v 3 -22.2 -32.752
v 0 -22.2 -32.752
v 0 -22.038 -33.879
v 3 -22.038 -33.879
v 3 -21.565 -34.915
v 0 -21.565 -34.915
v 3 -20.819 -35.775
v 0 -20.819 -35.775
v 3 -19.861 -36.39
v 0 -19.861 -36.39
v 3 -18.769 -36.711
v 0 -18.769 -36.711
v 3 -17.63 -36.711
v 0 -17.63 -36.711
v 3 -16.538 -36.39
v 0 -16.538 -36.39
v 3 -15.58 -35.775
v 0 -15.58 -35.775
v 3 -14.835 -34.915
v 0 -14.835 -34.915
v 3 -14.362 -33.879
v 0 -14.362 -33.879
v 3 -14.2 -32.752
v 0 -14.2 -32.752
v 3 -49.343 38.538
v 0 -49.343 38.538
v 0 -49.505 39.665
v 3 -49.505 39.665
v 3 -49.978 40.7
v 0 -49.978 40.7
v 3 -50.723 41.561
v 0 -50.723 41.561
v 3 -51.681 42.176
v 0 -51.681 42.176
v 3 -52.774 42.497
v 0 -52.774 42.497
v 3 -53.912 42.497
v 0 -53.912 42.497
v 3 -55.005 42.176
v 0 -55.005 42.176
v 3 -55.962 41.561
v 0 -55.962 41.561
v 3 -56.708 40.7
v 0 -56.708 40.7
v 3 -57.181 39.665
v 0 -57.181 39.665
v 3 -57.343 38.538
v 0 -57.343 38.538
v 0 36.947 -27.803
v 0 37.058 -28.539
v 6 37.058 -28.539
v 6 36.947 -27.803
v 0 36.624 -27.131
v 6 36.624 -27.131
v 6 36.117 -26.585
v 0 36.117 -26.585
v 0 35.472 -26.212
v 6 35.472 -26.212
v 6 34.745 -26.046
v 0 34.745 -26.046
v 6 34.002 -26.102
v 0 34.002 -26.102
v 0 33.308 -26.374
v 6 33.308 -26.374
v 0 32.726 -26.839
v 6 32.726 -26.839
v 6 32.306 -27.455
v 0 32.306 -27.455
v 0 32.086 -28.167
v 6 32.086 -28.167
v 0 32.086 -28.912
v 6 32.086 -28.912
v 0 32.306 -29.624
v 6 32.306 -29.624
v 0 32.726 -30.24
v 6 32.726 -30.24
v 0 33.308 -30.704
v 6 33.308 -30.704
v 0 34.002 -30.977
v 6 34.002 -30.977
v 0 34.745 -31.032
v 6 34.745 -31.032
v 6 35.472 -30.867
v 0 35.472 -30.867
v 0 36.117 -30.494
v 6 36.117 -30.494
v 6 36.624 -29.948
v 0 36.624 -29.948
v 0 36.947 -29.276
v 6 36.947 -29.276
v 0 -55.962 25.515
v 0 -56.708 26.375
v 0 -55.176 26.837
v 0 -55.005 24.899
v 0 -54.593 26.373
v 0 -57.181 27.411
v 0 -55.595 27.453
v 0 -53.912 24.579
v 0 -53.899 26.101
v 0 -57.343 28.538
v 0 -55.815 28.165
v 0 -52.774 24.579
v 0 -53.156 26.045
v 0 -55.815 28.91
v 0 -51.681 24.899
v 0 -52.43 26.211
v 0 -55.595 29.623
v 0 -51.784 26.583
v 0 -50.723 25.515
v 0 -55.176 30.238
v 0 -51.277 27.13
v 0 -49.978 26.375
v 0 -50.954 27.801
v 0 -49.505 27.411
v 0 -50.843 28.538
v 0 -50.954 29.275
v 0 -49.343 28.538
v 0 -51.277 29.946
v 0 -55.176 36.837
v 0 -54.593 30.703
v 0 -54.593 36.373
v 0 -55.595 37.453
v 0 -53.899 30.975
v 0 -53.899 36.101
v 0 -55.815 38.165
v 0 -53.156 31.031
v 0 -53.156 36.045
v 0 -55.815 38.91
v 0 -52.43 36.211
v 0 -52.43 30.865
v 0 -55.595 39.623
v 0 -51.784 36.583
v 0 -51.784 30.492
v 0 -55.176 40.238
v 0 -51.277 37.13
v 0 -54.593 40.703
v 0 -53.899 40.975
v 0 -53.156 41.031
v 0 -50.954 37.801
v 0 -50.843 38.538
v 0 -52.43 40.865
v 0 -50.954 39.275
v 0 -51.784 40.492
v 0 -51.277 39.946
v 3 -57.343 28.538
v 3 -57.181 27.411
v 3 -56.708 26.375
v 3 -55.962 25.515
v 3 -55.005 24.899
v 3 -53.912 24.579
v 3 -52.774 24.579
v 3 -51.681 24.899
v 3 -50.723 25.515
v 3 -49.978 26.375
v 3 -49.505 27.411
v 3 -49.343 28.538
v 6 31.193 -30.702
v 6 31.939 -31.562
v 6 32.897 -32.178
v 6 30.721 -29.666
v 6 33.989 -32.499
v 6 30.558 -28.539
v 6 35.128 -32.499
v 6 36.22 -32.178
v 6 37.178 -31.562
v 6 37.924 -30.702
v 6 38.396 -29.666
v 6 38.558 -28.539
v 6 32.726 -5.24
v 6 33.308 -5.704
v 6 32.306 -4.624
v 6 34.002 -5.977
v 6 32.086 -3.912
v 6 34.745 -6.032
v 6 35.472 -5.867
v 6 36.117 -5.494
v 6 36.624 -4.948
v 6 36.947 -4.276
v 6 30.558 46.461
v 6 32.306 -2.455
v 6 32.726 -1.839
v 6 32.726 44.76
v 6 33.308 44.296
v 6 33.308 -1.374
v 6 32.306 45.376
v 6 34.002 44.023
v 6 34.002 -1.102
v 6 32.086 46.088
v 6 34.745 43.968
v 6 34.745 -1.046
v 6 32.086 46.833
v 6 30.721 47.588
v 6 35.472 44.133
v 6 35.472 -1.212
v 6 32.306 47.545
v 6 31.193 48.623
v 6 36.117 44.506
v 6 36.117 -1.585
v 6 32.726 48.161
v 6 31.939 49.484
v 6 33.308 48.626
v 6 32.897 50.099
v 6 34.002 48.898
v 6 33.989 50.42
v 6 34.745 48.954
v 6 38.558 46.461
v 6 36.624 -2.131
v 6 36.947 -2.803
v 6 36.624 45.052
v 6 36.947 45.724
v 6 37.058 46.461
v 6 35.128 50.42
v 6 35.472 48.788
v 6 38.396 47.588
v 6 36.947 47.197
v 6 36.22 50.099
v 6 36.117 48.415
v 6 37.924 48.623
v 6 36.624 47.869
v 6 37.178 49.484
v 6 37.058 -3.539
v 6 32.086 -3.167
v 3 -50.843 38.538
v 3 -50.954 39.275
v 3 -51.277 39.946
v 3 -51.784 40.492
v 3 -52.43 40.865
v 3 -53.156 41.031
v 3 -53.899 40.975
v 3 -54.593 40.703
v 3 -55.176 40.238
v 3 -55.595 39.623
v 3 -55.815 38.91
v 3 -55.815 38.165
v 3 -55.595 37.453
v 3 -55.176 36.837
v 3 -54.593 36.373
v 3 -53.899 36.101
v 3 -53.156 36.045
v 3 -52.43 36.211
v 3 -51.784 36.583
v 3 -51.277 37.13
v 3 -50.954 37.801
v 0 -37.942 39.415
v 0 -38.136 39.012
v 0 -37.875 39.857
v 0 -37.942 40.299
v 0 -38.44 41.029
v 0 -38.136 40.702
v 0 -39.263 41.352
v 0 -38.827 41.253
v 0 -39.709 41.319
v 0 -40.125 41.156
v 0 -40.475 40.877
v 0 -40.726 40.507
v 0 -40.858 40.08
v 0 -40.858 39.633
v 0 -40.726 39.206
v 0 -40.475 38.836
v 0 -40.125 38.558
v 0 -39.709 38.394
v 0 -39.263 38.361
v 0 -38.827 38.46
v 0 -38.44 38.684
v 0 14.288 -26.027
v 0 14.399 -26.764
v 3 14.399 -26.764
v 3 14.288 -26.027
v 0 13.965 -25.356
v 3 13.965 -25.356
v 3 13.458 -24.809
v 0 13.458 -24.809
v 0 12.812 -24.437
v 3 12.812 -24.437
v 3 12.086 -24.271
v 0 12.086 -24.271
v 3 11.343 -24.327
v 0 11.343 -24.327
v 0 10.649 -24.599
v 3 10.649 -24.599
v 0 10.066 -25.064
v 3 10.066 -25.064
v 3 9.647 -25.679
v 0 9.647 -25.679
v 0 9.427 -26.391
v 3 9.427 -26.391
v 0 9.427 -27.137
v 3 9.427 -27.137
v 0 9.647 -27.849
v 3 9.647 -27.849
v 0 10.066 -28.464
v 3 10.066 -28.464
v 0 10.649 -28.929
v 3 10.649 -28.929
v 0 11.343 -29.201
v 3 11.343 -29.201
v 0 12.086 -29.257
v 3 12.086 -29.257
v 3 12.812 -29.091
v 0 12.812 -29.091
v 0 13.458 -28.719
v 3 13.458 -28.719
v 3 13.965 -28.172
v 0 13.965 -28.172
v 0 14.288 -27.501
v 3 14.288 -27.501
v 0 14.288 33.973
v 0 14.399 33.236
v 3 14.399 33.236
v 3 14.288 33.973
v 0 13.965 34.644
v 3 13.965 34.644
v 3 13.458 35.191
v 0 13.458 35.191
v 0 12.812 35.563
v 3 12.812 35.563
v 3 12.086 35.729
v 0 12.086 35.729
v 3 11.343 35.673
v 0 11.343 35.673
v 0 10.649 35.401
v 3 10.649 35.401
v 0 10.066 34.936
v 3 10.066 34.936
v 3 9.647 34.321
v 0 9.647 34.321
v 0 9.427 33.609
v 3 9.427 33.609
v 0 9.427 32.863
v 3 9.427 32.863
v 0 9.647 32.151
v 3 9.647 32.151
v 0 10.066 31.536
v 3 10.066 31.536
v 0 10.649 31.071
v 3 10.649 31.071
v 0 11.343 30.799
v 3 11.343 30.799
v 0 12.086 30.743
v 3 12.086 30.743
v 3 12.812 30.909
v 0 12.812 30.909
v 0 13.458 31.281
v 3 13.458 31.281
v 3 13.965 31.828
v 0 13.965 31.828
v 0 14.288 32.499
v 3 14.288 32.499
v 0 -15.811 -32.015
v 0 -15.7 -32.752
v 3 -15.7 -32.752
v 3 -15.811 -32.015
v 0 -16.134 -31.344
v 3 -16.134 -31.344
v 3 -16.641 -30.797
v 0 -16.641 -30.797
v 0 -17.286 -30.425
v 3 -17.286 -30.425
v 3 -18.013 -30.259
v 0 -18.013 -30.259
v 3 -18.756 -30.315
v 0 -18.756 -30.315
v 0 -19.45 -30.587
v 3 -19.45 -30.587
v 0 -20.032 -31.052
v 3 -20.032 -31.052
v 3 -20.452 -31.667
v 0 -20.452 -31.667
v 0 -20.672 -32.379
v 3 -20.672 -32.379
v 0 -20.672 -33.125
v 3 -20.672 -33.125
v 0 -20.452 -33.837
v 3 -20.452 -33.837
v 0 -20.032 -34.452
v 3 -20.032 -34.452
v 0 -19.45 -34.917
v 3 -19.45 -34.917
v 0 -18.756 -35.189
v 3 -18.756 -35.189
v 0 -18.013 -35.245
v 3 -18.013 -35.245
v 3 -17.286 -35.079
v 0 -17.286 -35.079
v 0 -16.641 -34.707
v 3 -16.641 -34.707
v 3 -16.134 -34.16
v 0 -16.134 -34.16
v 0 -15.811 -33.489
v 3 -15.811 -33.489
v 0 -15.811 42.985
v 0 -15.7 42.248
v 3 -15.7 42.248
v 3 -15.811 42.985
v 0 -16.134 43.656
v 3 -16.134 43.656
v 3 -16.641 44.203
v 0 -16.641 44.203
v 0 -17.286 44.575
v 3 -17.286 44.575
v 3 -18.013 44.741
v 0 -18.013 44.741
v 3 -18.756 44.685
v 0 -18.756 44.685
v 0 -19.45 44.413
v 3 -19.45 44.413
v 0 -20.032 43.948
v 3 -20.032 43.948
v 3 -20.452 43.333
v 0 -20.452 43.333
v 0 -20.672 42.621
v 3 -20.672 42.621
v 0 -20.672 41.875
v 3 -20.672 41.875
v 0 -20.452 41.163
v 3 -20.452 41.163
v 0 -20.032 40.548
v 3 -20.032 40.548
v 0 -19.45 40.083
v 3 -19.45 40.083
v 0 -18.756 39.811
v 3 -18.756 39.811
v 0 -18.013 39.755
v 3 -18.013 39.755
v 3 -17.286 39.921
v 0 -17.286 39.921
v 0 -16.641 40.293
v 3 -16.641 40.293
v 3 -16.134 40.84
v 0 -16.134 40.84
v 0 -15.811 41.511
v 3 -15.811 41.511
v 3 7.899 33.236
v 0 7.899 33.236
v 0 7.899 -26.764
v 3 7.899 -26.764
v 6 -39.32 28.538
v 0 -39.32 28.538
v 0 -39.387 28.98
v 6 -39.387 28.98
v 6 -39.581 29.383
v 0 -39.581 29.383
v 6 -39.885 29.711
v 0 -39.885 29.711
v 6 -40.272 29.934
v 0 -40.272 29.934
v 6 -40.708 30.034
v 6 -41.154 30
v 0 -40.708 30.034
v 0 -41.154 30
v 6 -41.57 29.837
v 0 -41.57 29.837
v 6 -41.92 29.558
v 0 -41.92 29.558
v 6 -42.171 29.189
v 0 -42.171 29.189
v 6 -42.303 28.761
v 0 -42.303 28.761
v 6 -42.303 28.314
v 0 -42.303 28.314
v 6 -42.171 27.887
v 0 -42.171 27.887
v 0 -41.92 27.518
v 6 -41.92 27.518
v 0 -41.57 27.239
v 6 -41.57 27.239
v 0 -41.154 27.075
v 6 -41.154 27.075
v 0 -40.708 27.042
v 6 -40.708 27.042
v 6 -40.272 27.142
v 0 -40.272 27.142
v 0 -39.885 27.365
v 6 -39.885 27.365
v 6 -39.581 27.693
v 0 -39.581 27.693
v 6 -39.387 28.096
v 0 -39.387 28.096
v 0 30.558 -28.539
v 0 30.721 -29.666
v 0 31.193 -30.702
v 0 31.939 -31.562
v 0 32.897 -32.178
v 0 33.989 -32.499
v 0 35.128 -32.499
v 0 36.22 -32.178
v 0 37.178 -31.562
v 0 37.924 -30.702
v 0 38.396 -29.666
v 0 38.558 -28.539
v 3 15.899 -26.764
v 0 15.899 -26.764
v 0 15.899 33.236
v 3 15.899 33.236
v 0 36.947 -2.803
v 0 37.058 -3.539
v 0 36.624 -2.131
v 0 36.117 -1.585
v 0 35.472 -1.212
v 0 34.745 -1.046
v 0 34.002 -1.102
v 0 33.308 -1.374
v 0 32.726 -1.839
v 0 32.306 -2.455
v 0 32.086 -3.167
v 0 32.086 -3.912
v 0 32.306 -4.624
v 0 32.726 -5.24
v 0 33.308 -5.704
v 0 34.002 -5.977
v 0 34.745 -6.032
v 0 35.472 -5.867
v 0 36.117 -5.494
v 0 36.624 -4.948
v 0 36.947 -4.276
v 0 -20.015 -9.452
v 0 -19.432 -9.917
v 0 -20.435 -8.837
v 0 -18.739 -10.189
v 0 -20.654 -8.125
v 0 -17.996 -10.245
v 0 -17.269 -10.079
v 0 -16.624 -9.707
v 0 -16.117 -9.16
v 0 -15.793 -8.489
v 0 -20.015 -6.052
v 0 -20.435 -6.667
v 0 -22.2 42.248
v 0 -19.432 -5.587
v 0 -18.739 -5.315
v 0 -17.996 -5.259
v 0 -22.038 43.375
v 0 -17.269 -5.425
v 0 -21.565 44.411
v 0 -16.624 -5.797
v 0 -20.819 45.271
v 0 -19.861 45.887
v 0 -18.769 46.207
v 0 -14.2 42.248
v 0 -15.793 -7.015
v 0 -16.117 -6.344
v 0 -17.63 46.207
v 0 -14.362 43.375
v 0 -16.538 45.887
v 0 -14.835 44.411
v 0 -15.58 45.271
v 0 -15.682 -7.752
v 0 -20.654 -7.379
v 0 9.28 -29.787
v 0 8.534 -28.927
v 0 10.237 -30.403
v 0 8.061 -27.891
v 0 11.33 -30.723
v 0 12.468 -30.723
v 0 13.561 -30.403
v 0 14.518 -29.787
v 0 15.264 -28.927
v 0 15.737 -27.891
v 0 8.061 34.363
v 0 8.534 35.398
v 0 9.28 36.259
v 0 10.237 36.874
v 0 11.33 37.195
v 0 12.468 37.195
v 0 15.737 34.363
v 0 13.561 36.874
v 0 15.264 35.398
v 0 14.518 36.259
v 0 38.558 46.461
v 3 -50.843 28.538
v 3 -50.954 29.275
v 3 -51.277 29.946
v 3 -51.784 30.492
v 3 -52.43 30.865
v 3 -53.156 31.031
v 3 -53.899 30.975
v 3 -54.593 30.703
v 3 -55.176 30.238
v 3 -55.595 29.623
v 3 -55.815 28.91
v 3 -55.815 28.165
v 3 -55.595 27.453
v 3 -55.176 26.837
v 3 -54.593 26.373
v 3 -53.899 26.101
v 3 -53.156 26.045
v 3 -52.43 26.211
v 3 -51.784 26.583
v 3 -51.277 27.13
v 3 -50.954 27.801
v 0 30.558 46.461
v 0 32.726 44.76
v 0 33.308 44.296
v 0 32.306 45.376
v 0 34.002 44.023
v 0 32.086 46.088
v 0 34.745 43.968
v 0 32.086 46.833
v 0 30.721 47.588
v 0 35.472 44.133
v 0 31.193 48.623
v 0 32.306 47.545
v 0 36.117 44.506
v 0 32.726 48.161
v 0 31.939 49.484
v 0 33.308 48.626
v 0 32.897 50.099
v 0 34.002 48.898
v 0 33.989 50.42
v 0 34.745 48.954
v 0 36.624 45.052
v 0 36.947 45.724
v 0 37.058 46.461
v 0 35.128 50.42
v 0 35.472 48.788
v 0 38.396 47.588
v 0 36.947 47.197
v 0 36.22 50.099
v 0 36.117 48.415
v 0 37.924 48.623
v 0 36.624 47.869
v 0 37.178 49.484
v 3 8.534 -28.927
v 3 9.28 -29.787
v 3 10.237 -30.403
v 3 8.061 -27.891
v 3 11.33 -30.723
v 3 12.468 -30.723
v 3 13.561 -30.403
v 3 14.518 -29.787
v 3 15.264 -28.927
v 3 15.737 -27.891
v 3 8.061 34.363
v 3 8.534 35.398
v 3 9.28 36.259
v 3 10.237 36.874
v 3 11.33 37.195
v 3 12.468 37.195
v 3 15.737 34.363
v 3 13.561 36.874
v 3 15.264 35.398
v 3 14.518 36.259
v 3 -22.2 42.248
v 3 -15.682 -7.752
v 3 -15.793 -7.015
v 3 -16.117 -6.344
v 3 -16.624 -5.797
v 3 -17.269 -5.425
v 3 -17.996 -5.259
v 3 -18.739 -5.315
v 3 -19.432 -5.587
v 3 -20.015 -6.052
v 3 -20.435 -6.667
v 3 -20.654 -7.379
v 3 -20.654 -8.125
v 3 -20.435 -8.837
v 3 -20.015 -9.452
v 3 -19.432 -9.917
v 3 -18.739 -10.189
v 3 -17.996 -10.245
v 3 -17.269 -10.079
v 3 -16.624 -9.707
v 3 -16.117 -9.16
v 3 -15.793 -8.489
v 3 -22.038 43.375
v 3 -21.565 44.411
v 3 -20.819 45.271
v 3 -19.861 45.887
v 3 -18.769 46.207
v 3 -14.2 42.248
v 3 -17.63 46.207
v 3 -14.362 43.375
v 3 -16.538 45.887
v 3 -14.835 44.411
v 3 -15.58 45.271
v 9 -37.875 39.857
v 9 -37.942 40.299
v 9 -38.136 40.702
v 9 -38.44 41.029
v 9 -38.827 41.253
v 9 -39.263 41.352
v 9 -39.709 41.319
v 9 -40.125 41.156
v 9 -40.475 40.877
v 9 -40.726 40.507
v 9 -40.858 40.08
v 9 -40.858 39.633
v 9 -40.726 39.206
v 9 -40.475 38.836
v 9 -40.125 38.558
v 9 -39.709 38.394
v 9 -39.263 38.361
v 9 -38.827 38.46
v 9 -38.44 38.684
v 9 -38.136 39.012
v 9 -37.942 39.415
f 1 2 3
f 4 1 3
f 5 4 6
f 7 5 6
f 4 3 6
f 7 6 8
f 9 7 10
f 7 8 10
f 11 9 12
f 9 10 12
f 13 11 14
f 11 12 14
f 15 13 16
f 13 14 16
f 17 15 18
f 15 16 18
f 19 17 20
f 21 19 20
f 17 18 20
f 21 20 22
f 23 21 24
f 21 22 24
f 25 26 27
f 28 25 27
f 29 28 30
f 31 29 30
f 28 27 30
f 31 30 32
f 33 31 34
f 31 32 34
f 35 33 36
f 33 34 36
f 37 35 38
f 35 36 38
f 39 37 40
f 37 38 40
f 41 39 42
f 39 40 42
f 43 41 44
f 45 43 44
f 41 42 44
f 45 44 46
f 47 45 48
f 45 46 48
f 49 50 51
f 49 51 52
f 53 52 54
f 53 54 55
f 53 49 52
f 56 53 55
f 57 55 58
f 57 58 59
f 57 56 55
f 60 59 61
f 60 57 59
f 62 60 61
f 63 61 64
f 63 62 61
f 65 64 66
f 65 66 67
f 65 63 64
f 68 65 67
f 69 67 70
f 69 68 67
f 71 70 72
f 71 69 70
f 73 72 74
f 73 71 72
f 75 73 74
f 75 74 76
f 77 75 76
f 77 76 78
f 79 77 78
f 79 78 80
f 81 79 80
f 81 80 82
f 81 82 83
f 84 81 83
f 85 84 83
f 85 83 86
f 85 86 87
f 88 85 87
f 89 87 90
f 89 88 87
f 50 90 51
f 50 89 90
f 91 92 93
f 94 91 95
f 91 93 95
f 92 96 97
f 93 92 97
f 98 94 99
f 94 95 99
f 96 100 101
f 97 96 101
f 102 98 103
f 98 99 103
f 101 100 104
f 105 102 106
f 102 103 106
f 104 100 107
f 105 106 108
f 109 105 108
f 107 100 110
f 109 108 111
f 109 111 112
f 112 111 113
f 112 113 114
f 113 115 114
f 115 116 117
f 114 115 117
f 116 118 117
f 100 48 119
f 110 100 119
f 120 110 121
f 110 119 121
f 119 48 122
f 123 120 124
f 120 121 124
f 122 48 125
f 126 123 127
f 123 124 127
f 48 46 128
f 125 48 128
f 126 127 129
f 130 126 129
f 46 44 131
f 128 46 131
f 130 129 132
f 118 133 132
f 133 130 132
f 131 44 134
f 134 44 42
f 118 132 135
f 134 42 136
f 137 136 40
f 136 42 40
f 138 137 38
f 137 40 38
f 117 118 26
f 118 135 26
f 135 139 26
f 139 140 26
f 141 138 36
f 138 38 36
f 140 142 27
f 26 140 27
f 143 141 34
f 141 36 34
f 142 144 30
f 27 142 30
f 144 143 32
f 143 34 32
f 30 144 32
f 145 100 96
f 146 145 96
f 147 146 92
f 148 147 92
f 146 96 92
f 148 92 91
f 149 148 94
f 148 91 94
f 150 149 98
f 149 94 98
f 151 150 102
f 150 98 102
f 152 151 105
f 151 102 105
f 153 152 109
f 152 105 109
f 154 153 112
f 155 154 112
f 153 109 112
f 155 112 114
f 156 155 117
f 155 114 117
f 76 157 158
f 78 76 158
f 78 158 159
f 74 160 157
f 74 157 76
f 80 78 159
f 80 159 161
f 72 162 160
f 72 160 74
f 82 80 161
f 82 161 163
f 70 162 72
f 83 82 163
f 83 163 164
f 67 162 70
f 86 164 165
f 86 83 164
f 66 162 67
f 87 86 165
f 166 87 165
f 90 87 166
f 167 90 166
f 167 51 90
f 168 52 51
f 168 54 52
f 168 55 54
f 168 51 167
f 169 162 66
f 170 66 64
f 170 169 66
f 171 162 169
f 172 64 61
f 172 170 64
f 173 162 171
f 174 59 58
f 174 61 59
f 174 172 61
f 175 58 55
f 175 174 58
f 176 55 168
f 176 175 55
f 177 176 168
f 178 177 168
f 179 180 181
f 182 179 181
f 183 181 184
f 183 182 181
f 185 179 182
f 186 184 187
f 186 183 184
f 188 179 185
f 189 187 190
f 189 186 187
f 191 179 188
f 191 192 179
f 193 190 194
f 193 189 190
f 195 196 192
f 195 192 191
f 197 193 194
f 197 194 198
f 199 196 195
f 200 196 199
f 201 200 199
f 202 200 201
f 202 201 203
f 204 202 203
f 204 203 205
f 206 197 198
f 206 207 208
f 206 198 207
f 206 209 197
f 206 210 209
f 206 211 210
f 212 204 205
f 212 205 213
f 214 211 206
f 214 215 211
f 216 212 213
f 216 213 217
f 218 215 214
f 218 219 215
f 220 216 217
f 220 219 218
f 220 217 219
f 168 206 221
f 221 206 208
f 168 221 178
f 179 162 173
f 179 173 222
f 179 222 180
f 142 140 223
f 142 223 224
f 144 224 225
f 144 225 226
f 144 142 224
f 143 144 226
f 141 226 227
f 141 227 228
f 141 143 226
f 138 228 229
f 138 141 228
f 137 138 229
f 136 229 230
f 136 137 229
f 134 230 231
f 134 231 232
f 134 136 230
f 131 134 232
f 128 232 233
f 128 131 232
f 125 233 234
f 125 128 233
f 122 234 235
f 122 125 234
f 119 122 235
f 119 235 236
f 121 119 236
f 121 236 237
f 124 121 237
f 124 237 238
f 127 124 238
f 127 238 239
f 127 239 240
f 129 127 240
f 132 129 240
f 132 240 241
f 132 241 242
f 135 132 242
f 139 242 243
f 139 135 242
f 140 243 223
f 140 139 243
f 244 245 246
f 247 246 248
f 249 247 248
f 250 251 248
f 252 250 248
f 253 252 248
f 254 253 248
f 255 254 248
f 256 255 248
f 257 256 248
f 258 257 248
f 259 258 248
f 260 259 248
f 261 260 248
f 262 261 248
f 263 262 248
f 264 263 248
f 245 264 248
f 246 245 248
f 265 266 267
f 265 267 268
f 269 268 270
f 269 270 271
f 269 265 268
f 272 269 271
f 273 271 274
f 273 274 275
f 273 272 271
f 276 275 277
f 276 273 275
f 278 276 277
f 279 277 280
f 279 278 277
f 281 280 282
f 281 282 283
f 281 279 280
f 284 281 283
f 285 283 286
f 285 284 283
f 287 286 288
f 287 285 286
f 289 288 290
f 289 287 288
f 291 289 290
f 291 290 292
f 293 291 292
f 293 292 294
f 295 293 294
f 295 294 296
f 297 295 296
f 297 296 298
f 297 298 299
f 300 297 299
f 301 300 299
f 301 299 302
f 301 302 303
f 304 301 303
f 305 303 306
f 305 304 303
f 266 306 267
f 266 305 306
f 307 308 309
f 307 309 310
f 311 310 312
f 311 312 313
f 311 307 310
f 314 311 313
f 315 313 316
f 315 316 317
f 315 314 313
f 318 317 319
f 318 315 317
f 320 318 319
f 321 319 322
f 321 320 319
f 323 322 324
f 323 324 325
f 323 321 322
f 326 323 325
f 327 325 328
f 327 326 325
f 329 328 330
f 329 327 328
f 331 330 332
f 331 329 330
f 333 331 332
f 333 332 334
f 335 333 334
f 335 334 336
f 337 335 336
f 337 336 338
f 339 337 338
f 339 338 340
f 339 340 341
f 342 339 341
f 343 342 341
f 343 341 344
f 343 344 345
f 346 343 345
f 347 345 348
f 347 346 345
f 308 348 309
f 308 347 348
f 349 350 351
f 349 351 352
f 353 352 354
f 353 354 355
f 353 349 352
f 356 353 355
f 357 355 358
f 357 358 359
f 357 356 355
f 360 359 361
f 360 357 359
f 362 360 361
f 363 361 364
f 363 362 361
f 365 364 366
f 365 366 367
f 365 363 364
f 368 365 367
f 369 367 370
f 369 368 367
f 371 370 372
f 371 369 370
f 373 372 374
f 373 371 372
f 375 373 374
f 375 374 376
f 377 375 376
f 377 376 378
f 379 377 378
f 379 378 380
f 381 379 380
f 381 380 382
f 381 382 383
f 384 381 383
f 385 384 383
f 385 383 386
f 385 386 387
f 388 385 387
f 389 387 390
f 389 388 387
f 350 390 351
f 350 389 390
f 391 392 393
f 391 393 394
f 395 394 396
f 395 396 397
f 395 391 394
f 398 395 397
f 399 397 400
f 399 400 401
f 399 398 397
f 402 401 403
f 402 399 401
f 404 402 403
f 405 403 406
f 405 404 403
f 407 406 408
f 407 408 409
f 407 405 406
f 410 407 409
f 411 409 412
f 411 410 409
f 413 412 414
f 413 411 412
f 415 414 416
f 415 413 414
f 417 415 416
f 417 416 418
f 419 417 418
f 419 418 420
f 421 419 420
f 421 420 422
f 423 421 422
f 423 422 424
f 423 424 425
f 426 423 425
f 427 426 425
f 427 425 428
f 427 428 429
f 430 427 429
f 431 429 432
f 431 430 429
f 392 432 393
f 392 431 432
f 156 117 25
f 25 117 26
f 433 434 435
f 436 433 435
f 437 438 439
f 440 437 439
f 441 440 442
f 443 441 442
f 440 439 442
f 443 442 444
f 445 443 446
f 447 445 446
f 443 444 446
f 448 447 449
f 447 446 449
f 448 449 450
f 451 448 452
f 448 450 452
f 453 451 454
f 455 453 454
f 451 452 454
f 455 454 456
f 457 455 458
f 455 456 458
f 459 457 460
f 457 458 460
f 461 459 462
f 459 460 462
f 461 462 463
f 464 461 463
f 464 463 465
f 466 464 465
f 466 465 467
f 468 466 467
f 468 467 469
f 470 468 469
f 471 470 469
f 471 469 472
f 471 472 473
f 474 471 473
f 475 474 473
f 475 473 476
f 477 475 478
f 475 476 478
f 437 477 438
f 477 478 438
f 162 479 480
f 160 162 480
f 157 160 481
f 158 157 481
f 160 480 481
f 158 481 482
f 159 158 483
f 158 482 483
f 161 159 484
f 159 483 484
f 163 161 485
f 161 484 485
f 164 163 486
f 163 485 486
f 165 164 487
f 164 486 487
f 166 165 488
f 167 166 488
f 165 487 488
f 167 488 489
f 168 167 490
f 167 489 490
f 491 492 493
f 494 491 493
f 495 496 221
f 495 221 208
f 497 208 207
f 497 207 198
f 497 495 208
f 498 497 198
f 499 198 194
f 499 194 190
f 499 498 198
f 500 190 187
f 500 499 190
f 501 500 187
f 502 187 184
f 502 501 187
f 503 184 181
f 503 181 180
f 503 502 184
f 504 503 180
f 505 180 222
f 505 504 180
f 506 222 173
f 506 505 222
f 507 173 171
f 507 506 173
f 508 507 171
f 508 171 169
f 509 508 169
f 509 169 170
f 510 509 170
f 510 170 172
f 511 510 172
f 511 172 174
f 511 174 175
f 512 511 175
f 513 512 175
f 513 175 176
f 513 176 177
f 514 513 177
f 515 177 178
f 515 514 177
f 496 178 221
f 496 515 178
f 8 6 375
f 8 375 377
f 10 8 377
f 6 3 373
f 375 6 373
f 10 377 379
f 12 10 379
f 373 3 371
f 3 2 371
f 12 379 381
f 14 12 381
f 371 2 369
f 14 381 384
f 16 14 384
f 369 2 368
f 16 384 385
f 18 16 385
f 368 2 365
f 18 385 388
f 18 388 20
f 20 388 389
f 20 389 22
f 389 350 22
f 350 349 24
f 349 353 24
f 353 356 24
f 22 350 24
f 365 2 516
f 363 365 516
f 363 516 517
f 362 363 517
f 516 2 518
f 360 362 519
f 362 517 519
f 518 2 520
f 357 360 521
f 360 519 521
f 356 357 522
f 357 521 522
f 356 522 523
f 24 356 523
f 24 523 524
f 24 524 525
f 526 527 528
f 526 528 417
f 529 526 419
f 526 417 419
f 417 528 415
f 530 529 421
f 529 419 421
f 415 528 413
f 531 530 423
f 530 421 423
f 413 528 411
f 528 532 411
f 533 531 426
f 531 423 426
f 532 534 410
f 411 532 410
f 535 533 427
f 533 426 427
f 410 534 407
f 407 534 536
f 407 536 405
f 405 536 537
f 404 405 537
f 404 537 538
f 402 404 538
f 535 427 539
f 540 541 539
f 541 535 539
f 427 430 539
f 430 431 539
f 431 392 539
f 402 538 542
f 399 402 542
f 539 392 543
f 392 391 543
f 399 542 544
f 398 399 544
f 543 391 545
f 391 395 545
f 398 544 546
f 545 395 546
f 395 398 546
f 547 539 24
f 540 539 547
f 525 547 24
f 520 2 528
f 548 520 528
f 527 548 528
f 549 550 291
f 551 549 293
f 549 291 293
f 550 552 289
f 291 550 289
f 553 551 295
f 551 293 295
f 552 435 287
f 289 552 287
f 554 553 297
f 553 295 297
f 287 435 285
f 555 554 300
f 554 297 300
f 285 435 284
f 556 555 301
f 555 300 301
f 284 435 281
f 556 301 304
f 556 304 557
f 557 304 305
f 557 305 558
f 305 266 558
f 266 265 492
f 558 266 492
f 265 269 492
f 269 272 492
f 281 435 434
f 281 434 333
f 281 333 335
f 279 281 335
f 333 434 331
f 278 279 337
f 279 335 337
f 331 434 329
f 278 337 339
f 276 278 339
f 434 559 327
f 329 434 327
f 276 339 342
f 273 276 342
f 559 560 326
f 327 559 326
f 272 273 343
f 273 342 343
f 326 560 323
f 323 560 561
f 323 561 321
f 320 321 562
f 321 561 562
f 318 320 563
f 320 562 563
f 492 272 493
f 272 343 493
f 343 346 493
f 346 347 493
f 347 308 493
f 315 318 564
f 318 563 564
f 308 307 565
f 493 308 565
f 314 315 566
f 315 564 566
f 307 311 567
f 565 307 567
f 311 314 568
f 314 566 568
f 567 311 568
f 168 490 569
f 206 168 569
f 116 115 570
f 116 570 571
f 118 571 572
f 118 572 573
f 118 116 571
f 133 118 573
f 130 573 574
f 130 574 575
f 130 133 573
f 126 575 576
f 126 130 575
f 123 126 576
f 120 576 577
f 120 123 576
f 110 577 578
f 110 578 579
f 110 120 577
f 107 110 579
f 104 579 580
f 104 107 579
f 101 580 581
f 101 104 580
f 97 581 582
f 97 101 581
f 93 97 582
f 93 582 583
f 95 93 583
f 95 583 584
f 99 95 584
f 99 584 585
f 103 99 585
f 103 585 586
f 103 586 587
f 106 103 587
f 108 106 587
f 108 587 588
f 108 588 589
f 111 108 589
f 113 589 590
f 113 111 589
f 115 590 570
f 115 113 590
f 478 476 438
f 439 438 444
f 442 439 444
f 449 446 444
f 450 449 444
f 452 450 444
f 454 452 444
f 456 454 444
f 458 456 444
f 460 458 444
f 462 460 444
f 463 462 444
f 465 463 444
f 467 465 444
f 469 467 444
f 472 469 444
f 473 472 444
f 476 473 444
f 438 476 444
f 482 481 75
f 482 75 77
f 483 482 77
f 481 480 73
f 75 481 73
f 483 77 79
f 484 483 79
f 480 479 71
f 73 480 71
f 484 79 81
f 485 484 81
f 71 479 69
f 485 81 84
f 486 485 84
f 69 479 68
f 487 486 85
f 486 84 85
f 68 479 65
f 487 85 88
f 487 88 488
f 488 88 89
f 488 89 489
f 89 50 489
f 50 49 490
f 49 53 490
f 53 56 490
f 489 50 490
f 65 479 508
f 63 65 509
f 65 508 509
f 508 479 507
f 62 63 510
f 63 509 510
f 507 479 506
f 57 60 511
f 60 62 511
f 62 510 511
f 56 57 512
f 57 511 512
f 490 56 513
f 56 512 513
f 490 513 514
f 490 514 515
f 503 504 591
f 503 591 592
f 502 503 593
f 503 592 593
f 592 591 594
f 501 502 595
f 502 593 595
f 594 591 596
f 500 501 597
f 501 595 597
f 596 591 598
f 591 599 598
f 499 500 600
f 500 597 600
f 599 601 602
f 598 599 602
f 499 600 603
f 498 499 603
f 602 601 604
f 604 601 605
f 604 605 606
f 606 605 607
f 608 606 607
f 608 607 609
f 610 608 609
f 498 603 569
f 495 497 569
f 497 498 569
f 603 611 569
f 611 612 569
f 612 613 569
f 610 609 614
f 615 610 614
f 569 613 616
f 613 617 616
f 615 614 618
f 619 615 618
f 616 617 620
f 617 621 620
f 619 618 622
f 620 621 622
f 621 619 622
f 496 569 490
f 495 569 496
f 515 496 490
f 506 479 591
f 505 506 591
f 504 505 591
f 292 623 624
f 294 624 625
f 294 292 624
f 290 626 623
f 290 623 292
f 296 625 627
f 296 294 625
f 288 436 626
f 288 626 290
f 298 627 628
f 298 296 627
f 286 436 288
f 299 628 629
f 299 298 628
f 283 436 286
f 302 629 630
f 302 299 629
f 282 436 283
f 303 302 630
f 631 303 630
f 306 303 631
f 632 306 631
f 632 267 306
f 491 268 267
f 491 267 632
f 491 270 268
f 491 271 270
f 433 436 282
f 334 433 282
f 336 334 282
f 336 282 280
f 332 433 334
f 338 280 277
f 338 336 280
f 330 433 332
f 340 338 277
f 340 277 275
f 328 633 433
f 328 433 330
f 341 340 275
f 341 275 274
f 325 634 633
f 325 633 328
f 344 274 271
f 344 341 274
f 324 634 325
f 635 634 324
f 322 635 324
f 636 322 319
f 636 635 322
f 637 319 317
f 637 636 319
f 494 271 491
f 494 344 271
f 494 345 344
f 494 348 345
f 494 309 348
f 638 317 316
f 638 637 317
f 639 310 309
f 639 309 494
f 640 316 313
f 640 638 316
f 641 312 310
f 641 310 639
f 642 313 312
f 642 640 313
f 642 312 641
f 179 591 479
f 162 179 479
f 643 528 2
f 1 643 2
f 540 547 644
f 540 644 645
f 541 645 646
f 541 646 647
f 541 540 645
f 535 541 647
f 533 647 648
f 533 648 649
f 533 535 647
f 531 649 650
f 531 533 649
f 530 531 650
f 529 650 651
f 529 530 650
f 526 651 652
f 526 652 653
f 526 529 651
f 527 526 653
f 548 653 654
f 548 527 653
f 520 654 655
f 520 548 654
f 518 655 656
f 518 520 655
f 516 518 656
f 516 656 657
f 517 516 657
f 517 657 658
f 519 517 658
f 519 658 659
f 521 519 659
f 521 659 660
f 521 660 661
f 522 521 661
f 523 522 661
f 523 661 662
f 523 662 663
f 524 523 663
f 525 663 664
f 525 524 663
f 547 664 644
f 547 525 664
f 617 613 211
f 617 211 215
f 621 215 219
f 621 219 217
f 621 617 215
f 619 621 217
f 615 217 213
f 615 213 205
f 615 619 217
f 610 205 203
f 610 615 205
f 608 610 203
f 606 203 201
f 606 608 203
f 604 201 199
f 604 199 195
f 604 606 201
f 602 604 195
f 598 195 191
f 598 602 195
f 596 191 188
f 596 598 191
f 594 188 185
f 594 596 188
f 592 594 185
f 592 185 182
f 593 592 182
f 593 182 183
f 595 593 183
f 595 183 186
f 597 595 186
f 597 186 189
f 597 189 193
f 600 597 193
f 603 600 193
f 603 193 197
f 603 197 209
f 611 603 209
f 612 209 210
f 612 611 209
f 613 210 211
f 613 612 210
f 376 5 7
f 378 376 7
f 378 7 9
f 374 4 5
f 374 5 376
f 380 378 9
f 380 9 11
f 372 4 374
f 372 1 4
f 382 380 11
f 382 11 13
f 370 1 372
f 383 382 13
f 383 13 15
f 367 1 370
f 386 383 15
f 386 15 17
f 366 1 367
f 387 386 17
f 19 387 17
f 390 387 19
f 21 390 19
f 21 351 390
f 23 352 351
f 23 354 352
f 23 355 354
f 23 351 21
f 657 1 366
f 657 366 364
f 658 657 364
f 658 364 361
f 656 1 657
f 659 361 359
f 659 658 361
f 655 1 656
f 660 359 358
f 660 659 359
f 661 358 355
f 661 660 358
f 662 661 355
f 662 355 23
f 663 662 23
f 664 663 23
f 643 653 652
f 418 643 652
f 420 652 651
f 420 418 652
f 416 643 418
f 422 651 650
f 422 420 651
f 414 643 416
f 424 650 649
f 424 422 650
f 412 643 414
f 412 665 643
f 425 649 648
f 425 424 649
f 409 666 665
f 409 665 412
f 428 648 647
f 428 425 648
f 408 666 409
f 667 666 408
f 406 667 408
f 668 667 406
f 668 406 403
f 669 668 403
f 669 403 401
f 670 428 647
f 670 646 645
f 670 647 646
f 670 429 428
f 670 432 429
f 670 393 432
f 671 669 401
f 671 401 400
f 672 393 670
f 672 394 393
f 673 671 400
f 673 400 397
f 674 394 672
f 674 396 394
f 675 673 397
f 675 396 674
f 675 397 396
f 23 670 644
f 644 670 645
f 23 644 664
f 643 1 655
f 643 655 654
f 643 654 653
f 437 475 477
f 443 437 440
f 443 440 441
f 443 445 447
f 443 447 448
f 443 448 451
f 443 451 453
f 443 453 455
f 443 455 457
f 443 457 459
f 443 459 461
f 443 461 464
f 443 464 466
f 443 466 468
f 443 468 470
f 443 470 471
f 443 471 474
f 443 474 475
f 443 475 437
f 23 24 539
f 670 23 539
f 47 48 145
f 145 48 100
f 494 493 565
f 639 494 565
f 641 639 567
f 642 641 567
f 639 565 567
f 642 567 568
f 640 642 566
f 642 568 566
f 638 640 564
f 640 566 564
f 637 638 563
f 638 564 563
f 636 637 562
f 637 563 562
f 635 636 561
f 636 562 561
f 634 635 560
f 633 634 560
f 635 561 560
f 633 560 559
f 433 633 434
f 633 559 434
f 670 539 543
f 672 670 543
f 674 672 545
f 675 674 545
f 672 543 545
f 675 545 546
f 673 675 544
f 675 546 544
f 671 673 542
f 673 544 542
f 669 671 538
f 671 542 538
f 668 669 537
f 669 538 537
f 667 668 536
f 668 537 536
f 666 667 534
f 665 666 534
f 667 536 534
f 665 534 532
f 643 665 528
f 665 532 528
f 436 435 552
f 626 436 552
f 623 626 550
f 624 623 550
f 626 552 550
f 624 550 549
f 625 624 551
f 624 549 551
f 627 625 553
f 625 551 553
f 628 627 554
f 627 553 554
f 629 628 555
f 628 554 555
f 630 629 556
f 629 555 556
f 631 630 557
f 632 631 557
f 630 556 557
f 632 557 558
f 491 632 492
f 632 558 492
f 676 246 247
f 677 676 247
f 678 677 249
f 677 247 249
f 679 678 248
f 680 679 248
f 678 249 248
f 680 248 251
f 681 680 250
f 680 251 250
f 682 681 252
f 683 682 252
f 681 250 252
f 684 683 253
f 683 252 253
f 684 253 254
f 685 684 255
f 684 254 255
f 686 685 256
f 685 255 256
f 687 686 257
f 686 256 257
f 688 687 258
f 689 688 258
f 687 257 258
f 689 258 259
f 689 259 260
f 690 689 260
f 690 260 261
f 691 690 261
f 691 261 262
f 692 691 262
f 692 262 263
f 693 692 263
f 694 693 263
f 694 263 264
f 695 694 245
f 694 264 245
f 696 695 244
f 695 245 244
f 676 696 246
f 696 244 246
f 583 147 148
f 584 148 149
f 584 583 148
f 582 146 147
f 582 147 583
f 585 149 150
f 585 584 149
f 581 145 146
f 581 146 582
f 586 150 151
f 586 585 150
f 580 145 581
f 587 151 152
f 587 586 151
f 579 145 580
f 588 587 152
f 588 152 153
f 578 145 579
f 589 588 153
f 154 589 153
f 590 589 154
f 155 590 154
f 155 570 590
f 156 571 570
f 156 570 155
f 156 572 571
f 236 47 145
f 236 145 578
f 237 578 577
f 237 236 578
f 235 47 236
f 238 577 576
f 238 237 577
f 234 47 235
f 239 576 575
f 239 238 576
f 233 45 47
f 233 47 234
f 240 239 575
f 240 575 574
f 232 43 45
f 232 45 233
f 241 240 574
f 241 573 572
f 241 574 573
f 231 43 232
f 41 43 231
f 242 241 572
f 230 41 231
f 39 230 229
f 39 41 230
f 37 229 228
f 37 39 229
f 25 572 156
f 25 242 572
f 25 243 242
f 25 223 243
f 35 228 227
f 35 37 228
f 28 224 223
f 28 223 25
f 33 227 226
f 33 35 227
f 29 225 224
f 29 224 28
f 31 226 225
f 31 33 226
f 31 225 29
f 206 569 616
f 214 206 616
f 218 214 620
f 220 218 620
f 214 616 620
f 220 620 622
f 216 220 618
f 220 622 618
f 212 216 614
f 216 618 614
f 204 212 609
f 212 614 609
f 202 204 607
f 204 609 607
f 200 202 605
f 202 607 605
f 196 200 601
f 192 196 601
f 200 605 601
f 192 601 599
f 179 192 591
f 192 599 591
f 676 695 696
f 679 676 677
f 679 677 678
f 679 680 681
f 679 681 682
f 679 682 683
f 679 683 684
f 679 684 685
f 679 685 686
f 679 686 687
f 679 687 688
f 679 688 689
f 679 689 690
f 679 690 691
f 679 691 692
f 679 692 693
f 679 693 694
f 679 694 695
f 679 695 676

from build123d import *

# Parameters (mm, degrees)
F0_R      = 2.5
F1_DEPTH  = 3
F2_R      = 1.5
F3_DEPTH  = 9
F4_R      = 2.5
F5_DEPTH  = 3
F6_R      = 2.5
F7_DEPTH  = 3
F8_R      = 2.5
F9_DEPTH  = 6
F10_R     = 1.5
F11_DEPTH = 6


with BuildPart() as f1:
    # F0 (on Right) → F1 (new body)
    with BuildSketch(Plane.YZ):
        with BuildLine():
            Line((-49.342894, 28.537845), (-49.342894, 38.537845))
            ThreePointArc((-49.342894, 38.537845), (-53.342894, 42.537845), (-57.342894, 38.537845))
            Line((-57.342894, 38.537845), (-57.342894, 28.537845))
            ThreePointArc((-57.342894, 28.537845), (-53.342894, 24.537845), (-49.342894, 28.537845))
        make_face()
        with Locations((-53.342894, 28.537845)):
            Circle(F0_R, mode=Mode.SUBTRACT)
        with Locations((-53.342894, 38.537845)):
            Circle(F0_R, mode=Mode.SUBTRACT)
    extrude(amount=F1_DEPTH)


with BuildPart() as f3:
    # F2 (on Right) → F3 (new body)
    with BuildSketch(Plane.YZ):
        with Locations((-39.375003, 39.856654)):
            Circle(F2_R)
    extrude(amount=F3_DEPTH)


with BuildPart() as f5:
    # F4 (on Right) → F5 (new body)
    with BuildSketch(Plane.YZ):
        with BuildLine():
            Line((-14.199558, -32.751966), (-14.199558, 42.248034))
            ThreePointArc((-14.199558, 42.248034), (-18.199558, 46.248034), (-22.199558, 42.248034))
            Line((-22.199558, 42.248034), (-22.199558, -32.751966))
            ThreePointArc((-22.199558, -32.751966), (-18.199558, -36.751966), (-14.199558, -32.751966))
        make_face()
        with Locations((-18.199558, -32.751966)):
            Circle(F4_R, mode=Mode.SUBTRACT)
        with Locations((-18.182341, -7.751966)):
            Circle(F4_R, mode=Mode.SUBTRACT)
        with Locations((-18.199558, 42.248034)):
            Circle(F4_R, mode=Mode.SUBTRACT)
    extrude(amount=F5_DEPTH)


with BuildPart() as f7:
    # F6 (on Right) → F7 (new body)
    with BuildSketch(Plane.YZ):
        with BuildLine():
            Line((15.898968, -26.764068), (15.898968, 33.235932))
            ThreePointArc((15.898968, 33.235932), (11.898968, 37.235932), (7.898968, 33.235932))
            Line((7.898968, 33.235932), (7.898968, -26.764068))
            ThreePointArc((7.898968, -26.764068), (11.898968, -30.764068), (15.898968, -26.764068))
        make_face()
        with Locations((11.898968, -26.764068)):
            Circle(F6_R, mode=Mode.SUBTRACT)
        with Locations((11.898968, 33.235932)):
            Circle(F6_R, mode=Mode.SUBTRACT)
    extrude(amount=F7_DEPTH)


with BuildPart() as f9:
    # F8 (on Right) → F9 (new body)
    with BuildSketch(Plane.YZ):
        with BuildLine():
            Line((38.55849, -28.539389), (38.55849, 46.460611))
            ThreePointArc((38.55849, 46.460611), (34.55849, 50.460611), (30.55849, 46.460611))
            Line((30.55849, 46.460611), (30.55849, -28.539389))
            ThreePointArc((30.55849, -28.539389), (34.55849, -32.539389), (38.55849, -28.539389))
        make_face()
        with Locations((34.55849, -28.539389)):
            Circle(F8_R, mode=Mode.SUBTRACT)
        with Locations((34.55849, -3.539389)):
            Circle(F8_R, mode=Mode.SUBTRACT)
        with Locations((34.55849, 46.460611)):
            Circle(F8_R, mode=Mode.SUBTRACT)
    extrude(amount=F9_DEPTH)


with BuildPart() as f11:
    # F10 (on Right) → F11 (new body)
    with BuildSketch(Plane.YZ):
        with Locations((-40.819954, 28.537845)):
            Circle(F10_R)
    extrude(amount=F11_DEPTH)


solid = Compound([f1.part, f3.part, f5.part, f7.part, f9.part, f11.part])
